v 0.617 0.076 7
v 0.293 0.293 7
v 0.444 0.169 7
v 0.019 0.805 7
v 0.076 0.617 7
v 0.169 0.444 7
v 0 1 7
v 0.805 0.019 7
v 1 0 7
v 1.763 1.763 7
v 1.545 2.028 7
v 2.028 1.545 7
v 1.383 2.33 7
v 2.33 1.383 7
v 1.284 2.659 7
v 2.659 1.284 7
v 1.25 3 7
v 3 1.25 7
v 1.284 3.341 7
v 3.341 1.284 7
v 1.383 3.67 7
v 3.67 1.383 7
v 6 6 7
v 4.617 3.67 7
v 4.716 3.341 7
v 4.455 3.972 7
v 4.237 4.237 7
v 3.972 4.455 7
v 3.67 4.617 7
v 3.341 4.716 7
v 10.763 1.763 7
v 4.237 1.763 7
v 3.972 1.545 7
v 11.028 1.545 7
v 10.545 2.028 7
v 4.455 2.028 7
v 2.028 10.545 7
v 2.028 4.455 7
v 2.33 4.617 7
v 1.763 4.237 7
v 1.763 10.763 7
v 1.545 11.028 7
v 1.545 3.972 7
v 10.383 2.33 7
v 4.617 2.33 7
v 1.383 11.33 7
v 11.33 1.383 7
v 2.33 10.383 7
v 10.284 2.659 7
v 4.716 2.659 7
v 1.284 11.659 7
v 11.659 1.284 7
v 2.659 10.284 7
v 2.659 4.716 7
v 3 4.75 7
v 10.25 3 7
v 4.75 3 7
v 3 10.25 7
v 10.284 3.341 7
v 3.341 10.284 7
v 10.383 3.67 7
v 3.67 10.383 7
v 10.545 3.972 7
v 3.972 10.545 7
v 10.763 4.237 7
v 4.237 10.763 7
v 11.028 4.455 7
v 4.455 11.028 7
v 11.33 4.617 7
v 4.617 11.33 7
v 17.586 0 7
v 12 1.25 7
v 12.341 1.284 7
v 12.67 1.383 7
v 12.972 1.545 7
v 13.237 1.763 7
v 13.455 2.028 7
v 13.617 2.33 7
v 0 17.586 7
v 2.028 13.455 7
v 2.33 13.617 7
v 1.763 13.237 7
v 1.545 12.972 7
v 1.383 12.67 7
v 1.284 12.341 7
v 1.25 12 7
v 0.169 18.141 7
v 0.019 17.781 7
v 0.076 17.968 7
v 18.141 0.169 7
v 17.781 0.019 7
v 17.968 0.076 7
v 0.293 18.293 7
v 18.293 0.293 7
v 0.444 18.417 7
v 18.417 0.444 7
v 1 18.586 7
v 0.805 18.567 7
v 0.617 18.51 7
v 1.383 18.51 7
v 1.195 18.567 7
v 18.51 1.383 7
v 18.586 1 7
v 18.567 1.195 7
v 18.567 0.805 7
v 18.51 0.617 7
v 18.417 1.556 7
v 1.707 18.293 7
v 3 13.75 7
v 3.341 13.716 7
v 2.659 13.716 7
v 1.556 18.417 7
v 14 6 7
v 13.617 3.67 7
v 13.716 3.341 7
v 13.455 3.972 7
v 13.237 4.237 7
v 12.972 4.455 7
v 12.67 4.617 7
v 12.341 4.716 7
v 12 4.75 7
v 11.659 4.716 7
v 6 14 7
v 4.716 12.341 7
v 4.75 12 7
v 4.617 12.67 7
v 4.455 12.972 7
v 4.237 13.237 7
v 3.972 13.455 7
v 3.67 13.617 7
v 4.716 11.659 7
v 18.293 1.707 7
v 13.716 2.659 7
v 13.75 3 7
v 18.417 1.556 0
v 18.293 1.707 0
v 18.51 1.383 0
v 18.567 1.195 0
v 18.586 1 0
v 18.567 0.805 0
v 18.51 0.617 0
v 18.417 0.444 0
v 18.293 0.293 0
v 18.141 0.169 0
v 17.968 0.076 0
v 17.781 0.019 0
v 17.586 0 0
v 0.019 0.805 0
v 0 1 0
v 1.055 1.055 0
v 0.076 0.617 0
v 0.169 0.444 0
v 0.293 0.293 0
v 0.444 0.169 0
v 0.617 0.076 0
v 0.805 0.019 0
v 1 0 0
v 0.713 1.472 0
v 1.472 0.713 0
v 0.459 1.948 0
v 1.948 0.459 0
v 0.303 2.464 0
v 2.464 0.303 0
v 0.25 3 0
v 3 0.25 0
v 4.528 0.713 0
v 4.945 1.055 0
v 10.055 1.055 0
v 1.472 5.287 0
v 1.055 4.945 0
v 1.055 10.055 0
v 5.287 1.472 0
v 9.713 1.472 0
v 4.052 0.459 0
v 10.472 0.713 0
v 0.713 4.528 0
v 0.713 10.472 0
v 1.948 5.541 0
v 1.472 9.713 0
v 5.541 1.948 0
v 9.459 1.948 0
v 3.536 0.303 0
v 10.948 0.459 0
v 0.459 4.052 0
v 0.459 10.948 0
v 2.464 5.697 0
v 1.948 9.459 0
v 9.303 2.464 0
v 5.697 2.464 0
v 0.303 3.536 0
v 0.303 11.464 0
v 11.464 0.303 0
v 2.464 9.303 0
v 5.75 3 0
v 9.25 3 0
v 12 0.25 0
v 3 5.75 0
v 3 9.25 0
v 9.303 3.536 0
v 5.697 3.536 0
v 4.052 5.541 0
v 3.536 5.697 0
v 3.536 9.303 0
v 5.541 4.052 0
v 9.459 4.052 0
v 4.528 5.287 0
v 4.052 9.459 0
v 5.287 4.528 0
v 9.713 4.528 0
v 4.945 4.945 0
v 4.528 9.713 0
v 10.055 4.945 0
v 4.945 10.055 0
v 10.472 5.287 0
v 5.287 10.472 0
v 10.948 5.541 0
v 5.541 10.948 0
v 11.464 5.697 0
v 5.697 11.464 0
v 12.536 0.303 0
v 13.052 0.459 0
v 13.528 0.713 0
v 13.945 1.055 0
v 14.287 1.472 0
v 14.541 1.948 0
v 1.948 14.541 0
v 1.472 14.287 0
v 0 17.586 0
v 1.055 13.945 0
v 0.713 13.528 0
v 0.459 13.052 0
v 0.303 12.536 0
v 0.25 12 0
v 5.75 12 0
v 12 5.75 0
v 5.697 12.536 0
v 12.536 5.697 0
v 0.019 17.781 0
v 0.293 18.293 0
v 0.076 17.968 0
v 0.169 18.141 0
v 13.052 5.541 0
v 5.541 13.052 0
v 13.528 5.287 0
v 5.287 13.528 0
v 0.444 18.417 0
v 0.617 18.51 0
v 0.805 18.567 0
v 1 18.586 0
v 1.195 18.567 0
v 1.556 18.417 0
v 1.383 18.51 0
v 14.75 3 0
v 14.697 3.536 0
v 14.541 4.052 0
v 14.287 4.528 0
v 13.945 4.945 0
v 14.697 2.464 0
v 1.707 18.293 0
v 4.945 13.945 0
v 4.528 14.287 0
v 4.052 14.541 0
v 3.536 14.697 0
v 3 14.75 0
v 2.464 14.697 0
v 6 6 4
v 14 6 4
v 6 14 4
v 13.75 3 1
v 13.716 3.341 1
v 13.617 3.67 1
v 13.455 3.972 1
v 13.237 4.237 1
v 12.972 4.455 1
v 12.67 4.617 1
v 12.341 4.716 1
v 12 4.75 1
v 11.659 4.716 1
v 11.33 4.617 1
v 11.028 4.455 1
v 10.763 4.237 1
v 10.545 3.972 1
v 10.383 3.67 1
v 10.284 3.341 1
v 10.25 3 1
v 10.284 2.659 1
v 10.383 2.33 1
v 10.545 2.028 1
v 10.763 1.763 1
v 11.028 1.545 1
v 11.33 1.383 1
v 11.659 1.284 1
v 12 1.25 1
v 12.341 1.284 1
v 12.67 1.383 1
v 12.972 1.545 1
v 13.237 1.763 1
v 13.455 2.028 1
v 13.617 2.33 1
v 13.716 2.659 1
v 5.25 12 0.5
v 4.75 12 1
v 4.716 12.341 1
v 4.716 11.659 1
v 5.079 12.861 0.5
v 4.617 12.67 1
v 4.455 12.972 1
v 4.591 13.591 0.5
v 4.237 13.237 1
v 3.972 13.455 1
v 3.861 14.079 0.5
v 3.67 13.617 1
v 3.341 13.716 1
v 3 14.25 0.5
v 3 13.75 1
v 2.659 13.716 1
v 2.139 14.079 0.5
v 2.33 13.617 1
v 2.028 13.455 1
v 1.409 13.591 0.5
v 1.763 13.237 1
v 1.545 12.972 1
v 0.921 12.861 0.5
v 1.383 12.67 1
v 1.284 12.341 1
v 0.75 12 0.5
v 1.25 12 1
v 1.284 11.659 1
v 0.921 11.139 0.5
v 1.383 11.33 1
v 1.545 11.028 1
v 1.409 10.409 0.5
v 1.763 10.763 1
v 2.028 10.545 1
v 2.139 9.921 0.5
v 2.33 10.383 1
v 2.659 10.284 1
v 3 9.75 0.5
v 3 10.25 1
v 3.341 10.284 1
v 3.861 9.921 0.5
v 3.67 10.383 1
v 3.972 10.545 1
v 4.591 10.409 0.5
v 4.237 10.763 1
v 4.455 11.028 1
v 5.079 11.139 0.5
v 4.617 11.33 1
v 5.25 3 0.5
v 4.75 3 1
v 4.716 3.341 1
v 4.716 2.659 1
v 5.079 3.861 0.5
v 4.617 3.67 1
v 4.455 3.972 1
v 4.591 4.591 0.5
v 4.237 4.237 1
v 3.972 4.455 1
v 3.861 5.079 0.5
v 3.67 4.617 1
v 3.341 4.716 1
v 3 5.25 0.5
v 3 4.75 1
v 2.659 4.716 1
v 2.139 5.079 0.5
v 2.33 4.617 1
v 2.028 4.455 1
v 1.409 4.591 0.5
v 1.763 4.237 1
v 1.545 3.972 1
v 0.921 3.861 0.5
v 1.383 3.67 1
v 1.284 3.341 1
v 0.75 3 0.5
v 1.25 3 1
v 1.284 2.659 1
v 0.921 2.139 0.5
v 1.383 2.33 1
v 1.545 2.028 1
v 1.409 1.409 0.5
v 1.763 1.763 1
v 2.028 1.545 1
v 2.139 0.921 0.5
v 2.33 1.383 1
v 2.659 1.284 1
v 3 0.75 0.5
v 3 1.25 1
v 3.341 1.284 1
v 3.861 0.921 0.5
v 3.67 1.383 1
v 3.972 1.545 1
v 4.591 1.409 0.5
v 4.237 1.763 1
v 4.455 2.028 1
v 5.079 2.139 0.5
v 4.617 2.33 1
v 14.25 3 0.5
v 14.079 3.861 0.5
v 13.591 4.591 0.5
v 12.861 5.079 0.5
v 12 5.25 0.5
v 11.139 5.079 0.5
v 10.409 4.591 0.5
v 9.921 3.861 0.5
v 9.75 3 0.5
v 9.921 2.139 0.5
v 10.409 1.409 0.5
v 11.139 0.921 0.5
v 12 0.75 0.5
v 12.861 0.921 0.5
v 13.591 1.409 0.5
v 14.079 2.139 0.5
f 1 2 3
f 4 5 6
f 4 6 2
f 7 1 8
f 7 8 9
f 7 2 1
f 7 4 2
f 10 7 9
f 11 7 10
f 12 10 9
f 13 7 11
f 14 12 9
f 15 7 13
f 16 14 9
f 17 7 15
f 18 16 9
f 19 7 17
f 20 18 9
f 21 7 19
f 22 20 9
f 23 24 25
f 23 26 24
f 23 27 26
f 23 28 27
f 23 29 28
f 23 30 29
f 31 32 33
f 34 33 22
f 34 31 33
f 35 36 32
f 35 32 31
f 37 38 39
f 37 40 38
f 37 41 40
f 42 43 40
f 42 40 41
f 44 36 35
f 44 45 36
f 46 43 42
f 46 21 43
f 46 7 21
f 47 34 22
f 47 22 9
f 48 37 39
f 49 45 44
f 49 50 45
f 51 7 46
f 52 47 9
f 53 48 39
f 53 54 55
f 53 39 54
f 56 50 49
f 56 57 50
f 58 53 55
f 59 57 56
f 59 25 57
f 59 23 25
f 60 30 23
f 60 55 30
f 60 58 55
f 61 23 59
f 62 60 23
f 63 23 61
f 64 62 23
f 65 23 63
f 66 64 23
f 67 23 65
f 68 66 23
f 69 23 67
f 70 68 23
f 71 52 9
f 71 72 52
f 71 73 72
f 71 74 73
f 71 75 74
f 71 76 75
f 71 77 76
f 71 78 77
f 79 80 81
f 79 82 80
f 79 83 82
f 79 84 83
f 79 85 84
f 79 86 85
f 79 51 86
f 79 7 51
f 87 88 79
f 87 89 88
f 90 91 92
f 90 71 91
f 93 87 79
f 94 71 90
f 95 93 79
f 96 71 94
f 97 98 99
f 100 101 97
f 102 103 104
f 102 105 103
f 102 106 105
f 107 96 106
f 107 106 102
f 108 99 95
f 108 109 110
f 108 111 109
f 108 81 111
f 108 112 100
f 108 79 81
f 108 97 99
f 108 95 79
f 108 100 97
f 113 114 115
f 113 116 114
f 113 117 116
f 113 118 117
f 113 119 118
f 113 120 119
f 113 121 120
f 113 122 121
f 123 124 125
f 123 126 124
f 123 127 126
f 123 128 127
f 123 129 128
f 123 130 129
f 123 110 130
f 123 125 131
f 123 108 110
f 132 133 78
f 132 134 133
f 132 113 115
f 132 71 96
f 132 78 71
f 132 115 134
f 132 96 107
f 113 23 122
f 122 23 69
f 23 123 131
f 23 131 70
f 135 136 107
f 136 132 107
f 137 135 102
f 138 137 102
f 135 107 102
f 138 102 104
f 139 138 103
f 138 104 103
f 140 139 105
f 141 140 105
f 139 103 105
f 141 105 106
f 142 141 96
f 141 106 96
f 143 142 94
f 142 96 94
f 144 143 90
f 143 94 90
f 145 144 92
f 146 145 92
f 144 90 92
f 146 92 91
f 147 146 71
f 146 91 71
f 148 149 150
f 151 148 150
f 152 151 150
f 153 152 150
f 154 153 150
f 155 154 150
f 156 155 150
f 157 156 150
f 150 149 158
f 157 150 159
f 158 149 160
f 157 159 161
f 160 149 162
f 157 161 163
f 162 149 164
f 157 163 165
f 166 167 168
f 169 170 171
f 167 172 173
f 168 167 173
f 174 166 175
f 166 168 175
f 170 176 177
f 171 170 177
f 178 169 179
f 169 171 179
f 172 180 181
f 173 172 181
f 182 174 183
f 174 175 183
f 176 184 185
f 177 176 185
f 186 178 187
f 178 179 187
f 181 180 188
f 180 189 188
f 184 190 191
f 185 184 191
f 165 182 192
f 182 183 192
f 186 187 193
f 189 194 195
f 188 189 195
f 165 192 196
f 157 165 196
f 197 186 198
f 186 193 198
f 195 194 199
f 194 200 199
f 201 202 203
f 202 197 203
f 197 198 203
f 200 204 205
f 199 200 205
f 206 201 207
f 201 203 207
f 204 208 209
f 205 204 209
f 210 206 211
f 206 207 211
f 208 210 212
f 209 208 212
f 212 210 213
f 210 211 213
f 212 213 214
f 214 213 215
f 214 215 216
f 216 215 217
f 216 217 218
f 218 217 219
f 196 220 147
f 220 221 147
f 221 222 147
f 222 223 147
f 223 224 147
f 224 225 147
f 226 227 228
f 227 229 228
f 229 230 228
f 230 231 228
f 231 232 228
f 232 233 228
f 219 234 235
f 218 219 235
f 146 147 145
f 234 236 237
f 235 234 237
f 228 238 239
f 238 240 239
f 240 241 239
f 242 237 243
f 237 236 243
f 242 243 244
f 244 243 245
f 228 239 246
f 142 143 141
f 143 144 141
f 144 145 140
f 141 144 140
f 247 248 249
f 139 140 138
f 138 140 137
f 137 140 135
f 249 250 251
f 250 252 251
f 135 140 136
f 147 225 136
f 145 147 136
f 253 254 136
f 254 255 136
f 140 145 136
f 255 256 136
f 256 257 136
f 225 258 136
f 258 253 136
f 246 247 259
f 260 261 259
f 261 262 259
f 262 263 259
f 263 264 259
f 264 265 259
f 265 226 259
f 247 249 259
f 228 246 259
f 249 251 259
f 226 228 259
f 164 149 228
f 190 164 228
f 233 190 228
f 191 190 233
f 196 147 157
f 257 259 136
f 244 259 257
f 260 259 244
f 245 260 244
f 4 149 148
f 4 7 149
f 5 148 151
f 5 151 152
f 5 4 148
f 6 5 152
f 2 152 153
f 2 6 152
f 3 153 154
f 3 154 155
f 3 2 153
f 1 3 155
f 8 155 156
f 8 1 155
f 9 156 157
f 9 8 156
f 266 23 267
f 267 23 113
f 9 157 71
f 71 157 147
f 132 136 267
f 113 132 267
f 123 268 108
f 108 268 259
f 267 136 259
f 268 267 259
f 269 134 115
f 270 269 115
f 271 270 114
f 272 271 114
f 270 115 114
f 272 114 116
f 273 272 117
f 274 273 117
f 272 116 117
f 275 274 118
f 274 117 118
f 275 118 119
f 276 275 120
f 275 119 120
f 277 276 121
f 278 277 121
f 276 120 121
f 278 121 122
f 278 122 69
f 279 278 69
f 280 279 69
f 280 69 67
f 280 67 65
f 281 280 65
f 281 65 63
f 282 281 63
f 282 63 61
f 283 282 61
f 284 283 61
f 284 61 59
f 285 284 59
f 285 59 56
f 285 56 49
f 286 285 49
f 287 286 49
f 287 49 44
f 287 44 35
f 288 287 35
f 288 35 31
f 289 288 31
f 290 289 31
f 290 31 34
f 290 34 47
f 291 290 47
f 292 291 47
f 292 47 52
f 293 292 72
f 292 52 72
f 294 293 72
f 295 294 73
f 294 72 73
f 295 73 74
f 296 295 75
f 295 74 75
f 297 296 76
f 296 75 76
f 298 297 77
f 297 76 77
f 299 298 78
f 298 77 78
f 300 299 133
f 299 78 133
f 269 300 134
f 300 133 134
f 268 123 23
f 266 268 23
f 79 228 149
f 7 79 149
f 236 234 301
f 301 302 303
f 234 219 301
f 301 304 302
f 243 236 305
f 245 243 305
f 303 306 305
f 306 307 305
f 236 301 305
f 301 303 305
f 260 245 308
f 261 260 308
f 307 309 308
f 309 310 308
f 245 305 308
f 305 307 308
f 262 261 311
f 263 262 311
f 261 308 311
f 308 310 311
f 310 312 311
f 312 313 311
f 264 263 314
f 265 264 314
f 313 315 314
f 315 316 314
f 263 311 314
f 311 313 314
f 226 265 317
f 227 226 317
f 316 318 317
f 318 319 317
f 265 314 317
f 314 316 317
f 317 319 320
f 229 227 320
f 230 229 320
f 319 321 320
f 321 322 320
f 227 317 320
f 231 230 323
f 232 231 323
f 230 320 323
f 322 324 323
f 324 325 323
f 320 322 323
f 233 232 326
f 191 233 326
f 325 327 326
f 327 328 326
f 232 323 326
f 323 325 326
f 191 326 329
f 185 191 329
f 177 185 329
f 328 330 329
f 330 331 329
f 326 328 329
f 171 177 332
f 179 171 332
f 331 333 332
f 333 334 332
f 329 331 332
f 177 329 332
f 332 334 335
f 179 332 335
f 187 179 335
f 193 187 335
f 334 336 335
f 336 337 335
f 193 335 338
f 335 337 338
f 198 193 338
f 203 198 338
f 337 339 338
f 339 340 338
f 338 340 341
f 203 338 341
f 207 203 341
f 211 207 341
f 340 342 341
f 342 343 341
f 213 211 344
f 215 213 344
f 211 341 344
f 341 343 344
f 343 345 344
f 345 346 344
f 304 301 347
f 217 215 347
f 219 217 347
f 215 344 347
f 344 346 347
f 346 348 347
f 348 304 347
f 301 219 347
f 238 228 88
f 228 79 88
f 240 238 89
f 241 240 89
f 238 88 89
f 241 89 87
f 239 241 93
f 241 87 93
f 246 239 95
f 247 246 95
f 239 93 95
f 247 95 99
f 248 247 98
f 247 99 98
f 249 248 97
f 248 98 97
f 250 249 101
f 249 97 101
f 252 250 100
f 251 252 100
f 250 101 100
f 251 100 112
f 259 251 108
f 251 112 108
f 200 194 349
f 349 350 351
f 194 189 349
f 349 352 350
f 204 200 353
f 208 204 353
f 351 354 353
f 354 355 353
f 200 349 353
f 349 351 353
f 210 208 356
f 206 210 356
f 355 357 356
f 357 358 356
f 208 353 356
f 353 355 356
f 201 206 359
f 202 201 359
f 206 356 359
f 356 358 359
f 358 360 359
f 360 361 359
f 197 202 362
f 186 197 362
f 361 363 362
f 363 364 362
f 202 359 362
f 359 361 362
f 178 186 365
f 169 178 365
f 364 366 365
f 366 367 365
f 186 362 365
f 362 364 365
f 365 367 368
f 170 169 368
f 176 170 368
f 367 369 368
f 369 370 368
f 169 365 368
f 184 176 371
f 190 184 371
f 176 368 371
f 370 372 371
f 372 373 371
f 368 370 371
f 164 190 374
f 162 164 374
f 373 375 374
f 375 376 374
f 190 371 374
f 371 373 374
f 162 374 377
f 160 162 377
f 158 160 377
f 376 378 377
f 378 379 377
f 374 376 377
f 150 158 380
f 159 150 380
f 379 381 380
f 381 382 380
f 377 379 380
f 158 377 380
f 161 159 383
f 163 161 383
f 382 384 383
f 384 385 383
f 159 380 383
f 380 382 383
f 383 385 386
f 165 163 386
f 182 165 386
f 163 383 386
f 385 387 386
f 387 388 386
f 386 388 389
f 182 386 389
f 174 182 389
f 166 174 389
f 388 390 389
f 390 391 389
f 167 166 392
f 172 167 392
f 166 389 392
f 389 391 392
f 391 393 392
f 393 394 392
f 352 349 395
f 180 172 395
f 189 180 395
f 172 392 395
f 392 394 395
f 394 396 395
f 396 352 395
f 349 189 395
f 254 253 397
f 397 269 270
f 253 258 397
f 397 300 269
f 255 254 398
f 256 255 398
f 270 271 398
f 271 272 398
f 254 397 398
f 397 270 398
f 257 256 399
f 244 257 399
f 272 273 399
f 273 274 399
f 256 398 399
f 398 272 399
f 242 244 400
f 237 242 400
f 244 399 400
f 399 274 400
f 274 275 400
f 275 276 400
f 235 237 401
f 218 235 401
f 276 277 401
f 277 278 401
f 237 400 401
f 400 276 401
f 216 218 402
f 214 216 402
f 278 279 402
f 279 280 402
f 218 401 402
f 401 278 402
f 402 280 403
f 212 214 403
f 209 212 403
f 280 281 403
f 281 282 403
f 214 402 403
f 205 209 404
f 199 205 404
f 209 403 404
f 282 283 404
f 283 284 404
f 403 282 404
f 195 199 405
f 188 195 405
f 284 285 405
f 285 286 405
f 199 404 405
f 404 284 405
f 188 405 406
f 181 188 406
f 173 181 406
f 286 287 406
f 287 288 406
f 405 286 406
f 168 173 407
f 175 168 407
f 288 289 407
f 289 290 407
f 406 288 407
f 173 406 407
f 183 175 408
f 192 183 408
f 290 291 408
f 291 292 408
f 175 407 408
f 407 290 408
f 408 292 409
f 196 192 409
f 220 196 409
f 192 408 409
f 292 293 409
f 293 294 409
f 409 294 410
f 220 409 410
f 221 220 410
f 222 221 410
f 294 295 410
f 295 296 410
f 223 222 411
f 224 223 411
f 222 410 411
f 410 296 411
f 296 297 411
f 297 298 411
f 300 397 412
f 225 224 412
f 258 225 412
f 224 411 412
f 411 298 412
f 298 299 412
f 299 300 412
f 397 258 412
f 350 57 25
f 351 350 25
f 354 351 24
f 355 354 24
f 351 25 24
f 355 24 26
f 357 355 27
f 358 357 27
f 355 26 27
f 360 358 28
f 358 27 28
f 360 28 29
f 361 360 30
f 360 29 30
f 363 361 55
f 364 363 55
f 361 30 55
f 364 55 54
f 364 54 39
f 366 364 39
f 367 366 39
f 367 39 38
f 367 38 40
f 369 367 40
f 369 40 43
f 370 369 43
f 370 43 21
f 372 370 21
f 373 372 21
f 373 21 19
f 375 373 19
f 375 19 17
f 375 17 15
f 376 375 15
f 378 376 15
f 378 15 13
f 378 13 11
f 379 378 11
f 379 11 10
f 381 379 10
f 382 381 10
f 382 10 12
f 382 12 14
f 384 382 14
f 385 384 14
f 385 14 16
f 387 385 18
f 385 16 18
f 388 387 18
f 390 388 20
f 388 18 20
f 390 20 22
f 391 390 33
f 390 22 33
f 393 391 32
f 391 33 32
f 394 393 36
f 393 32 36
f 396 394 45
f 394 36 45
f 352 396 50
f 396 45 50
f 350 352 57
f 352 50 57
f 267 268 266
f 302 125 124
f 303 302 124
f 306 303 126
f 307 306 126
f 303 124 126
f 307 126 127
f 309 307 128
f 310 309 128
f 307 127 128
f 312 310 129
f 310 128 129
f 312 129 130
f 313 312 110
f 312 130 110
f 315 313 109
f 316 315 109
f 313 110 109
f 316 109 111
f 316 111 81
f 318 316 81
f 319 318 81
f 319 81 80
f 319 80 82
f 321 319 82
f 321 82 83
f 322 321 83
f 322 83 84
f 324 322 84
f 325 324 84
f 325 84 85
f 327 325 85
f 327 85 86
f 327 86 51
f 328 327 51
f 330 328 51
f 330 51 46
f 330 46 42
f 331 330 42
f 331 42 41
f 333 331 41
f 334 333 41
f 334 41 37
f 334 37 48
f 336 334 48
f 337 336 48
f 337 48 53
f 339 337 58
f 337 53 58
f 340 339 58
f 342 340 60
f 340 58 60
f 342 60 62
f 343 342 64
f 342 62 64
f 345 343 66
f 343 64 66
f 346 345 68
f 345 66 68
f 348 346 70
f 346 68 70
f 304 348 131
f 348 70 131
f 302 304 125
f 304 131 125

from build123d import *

# Parameters (mm, degrees)
PAD_DEPTH       = 7
POCKET_DEPTH    = 3
SKETCH002_R     = 1.75
POCKET001_DEPTH = 7.001
FILLET_R        = 1
CHAMFER_SIZE    = 1


with BuildPart() as part:
    # Sketch → Pad (new body)
    with BuildSketch(Plane.XY):
        Polygon((0, 20), (0, 0), (20, 0), align=None)
    extrude(amount=PAD_DEPTH)

    # Sketch001 (on Face5 of Pad) → Pocket (cut)
    with BuildSketch(Plane.XY.offset(7)):
        Polygon((6, 14), (6, 6), (14, 6), align=None)
    extrude(amount=-POCKET_DEPTH, mode=Mode.SUBTRACT)

    # Sketch002 (on Face5 of Pocket) → Pocket001 (cut, through all)
    with BuildSketch(Plane.XY.offset(7)):
        with Locations((3, 3)):
            Circle(SKETCH002_R)
        with Locations((12, 3)):
            Circle(SKETCH002_R)
        with Locations((3, 12)):
            Circle(SKETCH002_R)
    extrude(amount=-POCKET001_DEPTH, mode=Mode.SUBTRACT)

    # Fillet
    fillet_edges = [part.edges().sort_by_distance(p)[0] for p in [
        (0, 0, 3.5),
        (20, 0, 3.5),
        (0, 20, 3.5),
    ]]
    fillet(fillet_edges, radius=FILLET_R)

    # Chamfer
    chamfer_edges = [part.edges().sort_by_distance(p)[0] for p in [
        (1.25, 12, 0),
        (10.25, 3, 0),
        (1.25, 3, 0),
    ]]
    chamfer(chamfer_edges, length=CHAMFER_SIZE)


solid = part.part
